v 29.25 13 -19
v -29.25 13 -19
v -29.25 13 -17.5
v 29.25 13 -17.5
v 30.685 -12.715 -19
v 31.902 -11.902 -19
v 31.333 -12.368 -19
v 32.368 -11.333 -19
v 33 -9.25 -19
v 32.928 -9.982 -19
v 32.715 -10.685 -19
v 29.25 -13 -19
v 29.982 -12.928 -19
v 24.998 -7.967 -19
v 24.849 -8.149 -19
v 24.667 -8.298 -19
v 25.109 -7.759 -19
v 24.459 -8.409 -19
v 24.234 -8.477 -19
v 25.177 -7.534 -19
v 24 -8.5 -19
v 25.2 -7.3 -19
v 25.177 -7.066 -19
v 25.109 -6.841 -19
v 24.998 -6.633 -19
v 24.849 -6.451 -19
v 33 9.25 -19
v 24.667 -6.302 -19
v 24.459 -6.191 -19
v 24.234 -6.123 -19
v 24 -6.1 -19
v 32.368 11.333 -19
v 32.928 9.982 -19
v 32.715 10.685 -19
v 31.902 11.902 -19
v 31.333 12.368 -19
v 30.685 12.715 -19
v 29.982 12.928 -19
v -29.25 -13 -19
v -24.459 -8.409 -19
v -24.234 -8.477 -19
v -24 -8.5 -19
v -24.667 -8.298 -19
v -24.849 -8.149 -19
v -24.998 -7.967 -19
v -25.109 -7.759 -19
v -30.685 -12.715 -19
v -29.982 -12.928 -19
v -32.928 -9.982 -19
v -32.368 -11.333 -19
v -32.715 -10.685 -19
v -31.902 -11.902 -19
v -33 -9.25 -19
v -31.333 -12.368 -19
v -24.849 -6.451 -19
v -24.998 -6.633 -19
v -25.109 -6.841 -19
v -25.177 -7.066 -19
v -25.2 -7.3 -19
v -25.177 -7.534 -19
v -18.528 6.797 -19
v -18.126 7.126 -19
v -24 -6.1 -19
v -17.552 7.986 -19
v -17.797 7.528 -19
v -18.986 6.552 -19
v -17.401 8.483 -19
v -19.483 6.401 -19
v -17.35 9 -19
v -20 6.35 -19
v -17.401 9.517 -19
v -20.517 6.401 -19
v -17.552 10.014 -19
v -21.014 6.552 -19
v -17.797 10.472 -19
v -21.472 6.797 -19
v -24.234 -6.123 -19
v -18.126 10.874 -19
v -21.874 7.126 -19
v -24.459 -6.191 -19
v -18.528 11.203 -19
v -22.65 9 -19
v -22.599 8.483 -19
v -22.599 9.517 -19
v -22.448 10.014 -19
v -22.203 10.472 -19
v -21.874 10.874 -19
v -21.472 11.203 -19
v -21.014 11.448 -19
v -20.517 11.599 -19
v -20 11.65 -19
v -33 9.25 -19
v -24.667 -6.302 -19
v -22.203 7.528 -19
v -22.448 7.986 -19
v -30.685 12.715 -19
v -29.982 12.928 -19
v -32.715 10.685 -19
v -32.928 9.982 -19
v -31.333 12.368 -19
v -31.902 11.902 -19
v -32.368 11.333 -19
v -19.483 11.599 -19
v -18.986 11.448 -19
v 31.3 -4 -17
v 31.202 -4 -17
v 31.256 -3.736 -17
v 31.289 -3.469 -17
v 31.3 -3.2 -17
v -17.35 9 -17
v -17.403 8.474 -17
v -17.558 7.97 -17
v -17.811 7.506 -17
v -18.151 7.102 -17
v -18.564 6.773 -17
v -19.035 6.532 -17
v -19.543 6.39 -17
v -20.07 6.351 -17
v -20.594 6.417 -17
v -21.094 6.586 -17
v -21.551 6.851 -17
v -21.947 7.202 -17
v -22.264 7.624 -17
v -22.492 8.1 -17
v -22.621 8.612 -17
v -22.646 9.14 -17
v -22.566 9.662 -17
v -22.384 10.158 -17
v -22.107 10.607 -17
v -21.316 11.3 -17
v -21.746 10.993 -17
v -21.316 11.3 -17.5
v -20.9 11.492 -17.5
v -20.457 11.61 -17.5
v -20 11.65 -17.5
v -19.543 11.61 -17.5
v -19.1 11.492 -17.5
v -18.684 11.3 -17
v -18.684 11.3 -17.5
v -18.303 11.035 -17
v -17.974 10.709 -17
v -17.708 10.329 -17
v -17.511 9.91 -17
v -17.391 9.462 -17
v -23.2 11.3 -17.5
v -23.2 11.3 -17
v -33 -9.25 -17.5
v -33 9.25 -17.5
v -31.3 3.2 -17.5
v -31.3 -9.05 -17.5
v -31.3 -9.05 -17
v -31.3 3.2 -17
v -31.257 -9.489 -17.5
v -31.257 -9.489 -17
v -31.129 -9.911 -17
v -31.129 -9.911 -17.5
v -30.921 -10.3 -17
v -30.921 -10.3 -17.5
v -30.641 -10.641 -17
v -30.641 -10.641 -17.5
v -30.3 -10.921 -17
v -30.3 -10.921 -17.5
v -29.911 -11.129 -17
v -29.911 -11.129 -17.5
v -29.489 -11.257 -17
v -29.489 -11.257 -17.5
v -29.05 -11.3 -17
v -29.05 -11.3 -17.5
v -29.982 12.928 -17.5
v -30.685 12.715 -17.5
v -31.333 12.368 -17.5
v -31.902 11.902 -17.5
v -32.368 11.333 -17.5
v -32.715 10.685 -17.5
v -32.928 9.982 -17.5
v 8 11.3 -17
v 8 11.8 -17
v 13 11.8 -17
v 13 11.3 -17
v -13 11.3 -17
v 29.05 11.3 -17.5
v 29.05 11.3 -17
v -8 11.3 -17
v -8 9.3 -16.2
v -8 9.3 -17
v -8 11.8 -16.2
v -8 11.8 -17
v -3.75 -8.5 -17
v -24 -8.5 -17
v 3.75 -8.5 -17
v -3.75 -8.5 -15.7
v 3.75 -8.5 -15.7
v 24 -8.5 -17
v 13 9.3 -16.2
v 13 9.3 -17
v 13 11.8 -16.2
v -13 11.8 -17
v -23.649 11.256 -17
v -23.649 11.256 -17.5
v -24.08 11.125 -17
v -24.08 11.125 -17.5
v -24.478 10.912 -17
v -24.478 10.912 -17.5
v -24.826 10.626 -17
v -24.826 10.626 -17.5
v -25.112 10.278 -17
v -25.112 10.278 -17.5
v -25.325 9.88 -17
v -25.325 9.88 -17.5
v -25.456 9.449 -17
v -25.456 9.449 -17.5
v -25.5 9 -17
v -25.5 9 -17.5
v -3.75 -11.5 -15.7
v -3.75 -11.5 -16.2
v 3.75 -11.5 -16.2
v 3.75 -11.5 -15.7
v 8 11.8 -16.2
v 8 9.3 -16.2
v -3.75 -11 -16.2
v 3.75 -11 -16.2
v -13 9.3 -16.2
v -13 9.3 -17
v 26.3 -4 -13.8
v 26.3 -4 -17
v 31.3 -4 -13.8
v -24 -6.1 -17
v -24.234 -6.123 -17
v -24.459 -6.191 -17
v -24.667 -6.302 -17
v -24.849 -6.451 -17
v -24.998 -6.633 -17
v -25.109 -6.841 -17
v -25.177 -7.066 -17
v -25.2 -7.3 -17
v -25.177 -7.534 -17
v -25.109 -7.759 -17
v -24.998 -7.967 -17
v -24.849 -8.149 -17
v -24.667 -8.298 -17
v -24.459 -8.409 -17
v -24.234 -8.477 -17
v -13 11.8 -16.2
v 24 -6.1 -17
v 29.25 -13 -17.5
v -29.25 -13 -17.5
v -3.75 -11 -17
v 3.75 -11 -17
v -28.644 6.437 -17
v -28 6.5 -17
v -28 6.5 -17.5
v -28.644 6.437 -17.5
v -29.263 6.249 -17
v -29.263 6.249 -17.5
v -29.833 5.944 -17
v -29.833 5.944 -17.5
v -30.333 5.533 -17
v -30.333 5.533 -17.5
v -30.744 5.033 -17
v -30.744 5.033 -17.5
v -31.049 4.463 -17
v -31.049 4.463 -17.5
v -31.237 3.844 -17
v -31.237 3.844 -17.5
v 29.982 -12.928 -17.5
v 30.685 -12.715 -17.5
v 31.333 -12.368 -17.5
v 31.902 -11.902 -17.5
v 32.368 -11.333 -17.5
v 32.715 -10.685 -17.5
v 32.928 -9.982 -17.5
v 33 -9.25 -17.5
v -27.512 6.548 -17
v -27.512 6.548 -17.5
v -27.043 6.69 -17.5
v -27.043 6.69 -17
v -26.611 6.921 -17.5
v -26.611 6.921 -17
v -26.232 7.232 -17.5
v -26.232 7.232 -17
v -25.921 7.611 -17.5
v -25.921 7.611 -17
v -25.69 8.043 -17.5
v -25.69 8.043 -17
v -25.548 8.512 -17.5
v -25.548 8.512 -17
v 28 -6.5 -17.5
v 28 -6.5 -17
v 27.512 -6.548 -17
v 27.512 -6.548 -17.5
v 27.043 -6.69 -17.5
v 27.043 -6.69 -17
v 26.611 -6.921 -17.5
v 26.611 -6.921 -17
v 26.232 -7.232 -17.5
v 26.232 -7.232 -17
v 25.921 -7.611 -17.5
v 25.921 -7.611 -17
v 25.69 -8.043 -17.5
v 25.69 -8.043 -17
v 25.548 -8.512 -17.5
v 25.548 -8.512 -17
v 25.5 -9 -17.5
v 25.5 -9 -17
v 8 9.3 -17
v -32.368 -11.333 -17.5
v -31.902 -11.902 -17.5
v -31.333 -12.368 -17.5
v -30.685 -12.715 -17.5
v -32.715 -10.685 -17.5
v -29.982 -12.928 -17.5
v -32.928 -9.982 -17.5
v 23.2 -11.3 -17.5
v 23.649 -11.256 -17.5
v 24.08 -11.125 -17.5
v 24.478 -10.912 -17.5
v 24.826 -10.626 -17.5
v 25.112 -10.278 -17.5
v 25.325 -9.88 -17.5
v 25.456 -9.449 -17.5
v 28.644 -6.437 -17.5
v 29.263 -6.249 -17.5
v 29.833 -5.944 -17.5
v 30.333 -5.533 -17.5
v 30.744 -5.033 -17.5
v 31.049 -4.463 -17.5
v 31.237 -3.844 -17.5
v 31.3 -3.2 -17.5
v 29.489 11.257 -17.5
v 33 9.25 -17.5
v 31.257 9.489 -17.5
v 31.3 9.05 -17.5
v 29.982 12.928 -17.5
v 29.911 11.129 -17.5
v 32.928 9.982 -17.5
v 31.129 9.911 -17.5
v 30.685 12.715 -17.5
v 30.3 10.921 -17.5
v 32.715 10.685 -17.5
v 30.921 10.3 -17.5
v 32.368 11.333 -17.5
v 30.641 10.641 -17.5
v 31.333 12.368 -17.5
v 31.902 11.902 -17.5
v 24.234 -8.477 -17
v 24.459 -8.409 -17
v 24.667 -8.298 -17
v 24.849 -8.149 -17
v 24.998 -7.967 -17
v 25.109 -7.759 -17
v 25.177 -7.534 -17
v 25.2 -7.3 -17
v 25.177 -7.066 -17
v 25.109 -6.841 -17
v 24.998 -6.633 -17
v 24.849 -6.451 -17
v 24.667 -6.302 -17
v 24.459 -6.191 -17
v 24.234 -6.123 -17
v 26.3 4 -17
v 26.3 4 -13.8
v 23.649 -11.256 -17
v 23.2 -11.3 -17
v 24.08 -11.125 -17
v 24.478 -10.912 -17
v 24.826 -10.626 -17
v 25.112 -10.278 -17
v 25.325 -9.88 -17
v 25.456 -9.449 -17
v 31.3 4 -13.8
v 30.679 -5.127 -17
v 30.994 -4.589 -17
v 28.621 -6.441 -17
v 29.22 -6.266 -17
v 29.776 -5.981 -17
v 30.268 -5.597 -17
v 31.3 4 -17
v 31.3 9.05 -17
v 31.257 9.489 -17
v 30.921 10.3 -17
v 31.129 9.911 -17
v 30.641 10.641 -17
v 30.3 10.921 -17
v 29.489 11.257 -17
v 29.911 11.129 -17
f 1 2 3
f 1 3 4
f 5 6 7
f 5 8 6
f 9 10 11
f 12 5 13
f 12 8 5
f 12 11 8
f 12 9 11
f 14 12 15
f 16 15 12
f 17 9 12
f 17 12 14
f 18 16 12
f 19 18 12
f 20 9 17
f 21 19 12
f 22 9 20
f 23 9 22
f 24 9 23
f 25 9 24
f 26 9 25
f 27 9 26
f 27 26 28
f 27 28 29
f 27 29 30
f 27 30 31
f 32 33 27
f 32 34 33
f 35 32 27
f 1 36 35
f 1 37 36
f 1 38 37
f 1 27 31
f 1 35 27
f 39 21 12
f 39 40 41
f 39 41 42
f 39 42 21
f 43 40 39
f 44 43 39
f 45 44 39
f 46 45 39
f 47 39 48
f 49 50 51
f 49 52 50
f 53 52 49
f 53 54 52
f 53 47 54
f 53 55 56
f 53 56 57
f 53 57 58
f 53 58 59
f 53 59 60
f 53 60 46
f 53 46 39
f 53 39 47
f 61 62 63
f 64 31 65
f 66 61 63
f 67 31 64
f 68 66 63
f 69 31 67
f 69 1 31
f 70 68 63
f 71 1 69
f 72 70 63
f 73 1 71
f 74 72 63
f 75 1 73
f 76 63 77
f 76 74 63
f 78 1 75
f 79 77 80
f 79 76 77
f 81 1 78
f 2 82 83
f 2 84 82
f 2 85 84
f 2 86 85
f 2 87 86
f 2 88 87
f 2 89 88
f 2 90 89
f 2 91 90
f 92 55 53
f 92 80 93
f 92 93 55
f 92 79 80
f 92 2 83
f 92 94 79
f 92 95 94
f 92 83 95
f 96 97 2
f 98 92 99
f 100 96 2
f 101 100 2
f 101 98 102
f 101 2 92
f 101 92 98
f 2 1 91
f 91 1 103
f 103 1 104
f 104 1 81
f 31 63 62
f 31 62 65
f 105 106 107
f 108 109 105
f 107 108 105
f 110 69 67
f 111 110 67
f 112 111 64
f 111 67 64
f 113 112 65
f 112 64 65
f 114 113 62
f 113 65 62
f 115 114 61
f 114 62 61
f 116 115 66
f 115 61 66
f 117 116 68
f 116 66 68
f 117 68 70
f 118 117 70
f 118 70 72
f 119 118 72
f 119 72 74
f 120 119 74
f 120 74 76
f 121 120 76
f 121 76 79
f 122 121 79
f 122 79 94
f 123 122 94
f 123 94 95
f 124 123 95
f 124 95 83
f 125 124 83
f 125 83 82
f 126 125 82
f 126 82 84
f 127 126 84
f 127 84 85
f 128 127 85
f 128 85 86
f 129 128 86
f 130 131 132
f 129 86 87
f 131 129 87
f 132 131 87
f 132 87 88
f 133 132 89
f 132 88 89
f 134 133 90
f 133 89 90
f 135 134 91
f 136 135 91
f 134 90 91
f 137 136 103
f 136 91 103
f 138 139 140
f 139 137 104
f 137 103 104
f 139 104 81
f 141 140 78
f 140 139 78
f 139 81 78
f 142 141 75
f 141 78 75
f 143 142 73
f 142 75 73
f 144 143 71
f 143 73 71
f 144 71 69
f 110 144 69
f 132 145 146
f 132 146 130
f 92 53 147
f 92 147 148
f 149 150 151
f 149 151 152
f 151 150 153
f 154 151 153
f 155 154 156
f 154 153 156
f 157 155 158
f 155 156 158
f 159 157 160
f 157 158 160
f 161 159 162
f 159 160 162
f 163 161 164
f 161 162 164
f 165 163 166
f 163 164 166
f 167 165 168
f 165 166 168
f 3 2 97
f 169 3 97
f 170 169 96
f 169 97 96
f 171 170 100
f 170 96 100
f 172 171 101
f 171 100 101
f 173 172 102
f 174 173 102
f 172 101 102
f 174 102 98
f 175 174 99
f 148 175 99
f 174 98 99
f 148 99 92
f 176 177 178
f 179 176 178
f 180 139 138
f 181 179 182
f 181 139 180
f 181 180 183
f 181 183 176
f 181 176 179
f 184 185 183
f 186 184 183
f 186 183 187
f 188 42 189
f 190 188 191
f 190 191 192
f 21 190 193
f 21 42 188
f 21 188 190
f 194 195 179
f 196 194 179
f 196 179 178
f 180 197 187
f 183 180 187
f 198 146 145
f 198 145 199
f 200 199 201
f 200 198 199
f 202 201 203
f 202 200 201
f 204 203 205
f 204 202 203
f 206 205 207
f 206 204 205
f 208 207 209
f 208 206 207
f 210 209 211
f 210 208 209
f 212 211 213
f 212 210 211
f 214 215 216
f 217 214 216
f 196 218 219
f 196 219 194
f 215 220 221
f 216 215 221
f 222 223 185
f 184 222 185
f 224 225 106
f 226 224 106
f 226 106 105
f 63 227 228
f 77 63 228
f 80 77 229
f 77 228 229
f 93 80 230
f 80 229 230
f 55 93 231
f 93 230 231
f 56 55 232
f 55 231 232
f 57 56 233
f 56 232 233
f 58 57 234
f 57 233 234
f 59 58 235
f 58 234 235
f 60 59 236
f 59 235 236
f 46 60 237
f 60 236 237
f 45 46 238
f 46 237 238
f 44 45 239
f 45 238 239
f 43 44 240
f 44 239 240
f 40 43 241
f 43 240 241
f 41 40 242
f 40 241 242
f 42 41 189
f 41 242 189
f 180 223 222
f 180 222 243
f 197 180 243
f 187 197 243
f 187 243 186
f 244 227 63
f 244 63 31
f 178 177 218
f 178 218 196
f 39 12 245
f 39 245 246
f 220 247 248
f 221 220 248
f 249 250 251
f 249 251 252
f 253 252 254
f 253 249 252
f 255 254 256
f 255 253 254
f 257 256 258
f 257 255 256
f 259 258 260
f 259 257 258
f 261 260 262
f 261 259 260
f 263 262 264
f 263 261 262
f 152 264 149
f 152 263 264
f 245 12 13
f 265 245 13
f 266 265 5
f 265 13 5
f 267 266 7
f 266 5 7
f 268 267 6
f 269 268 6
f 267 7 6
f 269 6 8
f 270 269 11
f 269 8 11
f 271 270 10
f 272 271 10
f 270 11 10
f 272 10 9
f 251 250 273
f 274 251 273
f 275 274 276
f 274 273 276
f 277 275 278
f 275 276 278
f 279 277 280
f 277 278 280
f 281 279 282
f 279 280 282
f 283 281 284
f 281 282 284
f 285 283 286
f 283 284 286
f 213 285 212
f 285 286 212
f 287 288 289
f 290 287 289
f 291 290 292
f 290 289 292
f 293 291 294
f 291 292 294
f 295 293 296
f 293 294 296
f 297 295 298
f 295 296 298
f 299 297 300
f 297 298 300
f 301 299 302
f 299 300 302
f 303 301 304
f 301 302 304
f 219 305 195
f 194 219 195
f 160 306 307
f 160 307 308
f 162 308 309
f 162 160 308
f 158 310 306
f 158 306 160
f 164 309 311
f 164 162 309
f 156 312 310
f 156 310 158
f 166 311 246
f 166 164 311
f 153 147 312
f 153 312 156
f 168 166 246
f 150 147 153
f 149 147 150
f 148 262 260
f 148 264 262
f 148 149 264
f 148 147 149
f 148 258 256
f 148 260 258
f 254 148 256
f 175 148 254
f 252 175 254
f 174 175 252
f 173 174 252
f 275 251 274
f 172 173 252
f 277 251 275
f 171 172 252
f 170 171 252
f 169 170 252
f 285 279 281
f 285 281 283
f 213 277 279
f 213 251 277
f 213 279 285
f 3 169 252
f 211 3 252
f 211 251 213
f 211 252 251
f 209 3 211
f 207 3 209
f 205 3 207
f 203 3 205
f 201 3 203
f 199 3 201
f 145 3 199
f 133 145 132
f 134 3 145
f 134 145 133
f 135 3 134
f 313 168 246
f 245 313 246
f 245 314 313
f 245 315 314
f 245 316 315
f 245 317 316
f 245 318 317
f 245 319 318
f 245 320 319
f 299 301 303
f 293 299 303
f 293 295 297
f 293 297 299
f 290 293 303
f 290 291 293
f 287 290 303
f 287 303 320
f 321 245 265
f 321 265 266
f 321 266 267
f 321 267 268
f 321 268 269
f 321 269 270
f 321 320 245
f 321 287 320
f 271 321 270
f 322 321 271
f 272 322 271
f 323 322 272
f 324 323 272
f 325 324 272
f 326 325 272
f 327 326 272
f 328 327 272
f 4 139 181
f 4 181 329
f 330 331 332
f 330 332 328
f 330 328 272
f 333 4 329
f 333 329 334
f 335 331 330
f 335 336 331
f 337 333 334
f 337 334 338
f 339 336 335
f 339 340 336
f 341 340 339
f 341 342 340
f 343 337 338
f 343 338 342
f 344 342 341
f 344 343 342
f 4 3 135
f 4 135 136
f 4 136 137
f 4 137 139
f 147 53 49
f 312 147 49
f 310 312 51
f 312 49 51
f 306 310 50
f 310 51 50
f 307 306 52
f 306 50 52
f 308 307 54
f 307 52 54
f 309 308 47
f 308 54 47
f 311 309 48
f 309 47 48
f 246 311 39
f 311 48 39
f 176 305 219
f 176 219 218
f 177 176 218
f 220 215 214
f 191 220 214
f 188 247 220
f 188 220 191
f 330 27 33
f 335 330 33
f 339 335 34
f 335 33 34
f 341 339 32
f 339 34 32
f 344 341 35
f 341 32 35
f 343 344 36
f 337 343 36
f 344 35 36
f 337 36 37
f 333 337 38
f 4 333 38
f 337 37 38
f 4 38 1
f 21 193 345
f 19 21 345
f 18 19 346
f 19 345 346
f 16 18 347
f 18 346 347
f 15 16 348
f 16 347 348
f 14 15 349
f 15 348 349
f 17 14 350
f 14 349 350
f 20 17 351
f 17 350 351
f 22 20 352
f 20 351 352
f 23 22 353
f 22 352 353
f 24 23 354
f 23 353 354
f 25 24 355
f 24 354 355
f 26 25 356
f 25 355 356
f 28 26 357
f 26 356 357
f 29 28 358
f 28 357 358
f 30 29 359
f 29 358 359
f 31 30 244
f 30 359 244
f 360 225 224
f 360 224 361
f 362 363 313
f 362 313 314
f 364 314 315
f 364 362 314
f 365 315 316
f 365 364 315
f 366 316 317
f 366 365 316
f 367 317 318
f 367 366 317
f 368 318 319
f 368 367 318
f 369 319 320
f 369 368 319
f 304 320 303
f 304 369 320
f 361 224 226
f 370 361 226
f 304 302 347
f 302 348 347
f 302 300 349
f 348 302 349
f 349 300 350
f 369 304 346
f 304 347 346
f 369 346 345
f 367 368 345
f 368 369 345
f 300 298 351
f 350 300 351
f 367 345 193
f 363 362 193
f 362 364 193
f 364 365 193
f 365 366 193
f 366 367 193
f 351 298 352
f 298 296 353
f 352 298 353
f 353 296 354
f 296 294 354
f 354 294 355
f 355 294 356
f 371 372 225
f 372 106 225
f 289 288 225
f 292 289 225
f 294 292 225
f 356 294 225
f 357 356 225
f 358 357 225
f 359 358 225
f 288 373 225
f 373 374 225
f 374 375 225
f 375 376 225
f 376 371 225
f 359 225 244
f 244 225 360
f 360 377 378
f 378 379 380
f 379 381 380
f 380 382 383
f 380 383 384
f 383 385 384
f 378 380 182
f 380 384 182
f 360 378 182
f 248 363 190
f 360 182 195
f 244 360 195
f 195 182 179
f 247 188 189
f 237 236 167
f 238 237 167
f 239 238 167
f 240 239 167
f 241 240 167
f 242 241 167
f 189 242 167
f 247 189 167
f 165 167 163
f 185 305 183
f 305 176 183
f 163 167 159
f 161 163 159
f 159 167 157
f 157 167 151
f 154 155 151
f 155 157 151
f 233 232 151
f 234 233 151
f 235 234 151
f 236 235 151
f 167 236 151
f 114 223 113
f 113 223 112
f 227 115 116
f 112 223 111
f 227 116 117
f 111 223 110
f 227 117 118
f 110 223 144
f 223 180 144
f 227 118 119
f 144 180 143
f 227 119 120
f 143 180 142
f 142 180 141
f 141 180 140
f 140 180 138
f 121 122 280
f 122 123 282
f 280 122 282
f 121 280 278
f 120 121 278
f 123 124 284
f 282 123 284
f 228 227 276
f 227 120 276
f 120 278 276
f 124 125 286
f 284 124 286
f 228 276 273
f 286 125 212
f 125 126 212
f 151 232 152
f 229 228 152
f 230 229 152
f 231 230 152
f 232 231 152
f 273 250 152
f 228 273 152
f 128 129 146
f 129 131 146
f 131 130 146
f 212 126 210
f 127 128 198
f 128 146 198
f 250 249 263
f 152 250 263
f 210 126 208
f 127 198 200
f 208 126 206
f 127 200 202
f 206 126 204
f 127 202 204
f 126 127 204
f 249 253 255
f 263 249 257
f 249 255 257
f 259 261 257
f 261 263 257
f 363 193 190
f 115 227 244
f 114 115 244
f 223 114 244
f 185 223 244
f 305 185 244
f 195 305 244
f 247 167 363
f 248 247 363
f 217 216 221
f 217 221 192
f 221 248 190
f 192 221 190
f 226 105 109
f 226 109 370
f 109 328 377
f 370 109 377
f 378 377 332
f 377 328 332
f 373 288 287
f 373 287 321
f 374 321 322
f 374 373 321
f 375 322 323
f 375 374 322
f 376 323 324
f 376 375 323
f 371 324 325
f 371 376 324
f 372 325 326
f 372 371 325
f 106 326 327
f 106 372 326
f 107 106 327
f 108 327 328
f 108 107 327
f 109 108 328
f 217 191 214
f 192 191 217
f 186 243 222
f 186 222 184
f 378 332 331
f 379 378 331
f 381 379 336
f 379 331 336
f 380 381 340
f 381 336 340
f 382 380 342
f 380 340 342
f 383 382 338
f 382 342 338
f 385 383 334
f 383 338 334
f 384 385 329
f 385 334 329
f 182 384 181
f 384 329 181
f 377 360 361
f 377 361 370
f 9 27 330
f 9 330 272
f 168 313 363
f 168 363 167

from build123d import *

# Parameters (mm, degrees)
PAD007_DEPTH    = 1.5
PAD008_DEPTH    = 0.5
SKETCH012_W     = 5
SKETCH012_H     = 2.5
SKETCH012_W_2   = 7.5
PAD009_DEPTH    = 0.8
SKETCH013_W     = 7.5
SKETCH013_H     = 3
PAD010_DEPTH    = 0.5
POCKET003_DEPTH = 0.5
POCKET004_DEPTH = 2
SKETCH021_W     = 5
SKETCH021_H     = 8
PAD013_DEPTH    = 3.2
SKETCH024_R     = 2.65
POCKET007_DEPTH = 5.201


with BuildPart() as part:
    # Sketch010 → Pad007 (new body)
    with BuildSketch(Plane.XY.offset(-19)):
        with BuildLine():
            Line((-29.25, 13), (29.25, 13))
            ThreePointArc((33, 9.25), (31.9016504294, 11.9016504294), (29.25, 13))
            Line((33, 9.25), (33, -9.25))
            ThreePointArc((29.25, -13), (31.9016504295, -11.9016504294), (33, -9.25))
            Line((29.25, -13), (-29.25, -13))
            ThreePointArc((-33, -9.25), (-31.9016504294, -11.9016504295), (-29.25, -13))
            Line((-33, -9.25), (-33, 9.25))
            ThreePointArc((-29.25, 13), (-31.9016504294, 11.9016504294), (-33, 9.25))
        make_face()
    extrude(amount=PAD007_DEPTH)

    # Sketch011 → Pad008 (new body)
    with BuildSketch(Plane.XY.offset(-17.5)):
        with BuildLine():
            Line((-29.05, 11.3), (29.05, 11.3))
            ThreePointArc((31.3, 9.05), (30.6409902577, 10.6409902577), (29.05, 11.3))
            Line((31.3, 9.05), (31.3, -9.05))
            ThreePointArc((29.05, -11.3), (30.6409902577, -10.6409902577), (31.3, -9.05))
            Line((29.05, -11.3), (-29.05, -11.3))
            ThreePointArc((-31.3, -9.05), (-30.6409902577, -10.6409902577), (-29.05, -11.3))
            Line((-31.3, -9.05), (-31.3, 9.05))
            ThreePointArc((-29.05, 11.3), (-30.6409902577, 10.6409902577), (-31.3, 9.05))
        make_face()
    extrude(amount=PAD008_DEPTH)

    # Sketch012 → Pad009 (new body)
    with BuildSketch(Plane.XY.offset(-17)):
        with Locations((-10.5, 10.55)):
            Rectangle(SKETCH012_W, SKETCH012_H)
        with Locations((10.5, 10.55)):
            Rectangle(SKETCH012_W, SKETCH012_H)
        with Locations((0, -9.75)):
            Rectangle(SKETCH012_W_2, SKETCH012_H)
    extrude(amount=PAD009_DEPTH)

    # Sketch013 → Pad010 (new body)
    with BuildSketch(Plane.XY.offset(-16.2)):
        with Locations((0, -10)):
            Rectangle(SKETCH013_W, SKETCH013_H)
    extrude(amount=PAD010_DEPTH)

    # Sketch016 → Pocket003 (cut)
    with BuildSketch(Plane.XY.offset(-17)):
        with BuildLine():
            ThreePointArc((28.0000015561, -6.5), (26.2322341473, -7.2322319467), (25.5, -8.9999984439))
            ThreePointArc((23.2000163651, -11.3), (24.8263541015, -10.6263414294), (25.5, -8.999998444))
            Line((23.2000163651, -11.5), (23.2000163651, -11.3))
            Line((31.5, -11.5), (23.2000163651, -11.5))
            Line((31.5, -3.2000163651), (31.5, -11.5))
            Line((31.3, -3.2000163651), (31.5, -3.2000163651))
            ThreePointArc((28.0000015561, -6.5), (30.3334480205, -5.5334584921), (31.3, -3.2000163651))
        make_face()
        with BuildLine():
            Line((-23.2000163651, 11.3), (-23.2000163651, 11.5))
            Line((-23.2000163651, 11.5), (-31.5, 11.5))
            Line((-31.5, 11.5), (-31.5, 3.2000163651))
            Line((-31.5, 3.2000163651), (-31.3, 3.2000163651))
            ThreePointArc((-28.000005004, 6.5), (-30.3334514906, 5.5334595241), (-31.3, 3.2000163651))
            ThreePointArc((-28.000005004, 6.5), (-26.2322365854, 7.2322295087), (-25.5, 8.999994996))
            ThreePointArc((-23.2000163651, 11.3), (-24.8263548156, 10.6263397054), (-25.5, 8.999994996))
        make_face()
    extrude(amount=-POCKET003_DEPTH, mode=Mode.SUBTRACT)

    # Sketch017 → Pocket004 (cut)
    with BuildSketch(Plane.XY.offset(-17)):
        with BuildLine():
            ThreePointArc((-24, -6.1), (-25.2, -7.3), (-24, -8.5))
            Line((-24, -8.5), (24, -8.5))
            ThreePointArc((24, -8.5), (25.2, -7.3), (24, -6.1))
            Line((-24, -6.1), (24, -6.1))
        make_face()
    extrude(amount=-POCKET004_DEPTH, mode=Mode.SUBTRACT)

    # Sketch021 → Pad013 (new body)
    with BuildSketch(Plane.XY.offset(-17)):
        with Locations((28.8, 0)):
            Rectangle(SKETCH021_W, SKETCH021_H)
    extrude(amount=PAD013_DEPTH)

    # Sketch024 → Pocket007 (cut, through all)
    with BuildSketch(Plane(origin=(0, 0, -19), x_dir=(1, 0, 0), z_dir=(0, 0, -1))):
        with Locations((-20, -9)):
            Circle(SKETCH024_R)
    extrude(amount=-POCKET007_DEPTH, mode=Mode.SUBTRACT)


solid = part.part
